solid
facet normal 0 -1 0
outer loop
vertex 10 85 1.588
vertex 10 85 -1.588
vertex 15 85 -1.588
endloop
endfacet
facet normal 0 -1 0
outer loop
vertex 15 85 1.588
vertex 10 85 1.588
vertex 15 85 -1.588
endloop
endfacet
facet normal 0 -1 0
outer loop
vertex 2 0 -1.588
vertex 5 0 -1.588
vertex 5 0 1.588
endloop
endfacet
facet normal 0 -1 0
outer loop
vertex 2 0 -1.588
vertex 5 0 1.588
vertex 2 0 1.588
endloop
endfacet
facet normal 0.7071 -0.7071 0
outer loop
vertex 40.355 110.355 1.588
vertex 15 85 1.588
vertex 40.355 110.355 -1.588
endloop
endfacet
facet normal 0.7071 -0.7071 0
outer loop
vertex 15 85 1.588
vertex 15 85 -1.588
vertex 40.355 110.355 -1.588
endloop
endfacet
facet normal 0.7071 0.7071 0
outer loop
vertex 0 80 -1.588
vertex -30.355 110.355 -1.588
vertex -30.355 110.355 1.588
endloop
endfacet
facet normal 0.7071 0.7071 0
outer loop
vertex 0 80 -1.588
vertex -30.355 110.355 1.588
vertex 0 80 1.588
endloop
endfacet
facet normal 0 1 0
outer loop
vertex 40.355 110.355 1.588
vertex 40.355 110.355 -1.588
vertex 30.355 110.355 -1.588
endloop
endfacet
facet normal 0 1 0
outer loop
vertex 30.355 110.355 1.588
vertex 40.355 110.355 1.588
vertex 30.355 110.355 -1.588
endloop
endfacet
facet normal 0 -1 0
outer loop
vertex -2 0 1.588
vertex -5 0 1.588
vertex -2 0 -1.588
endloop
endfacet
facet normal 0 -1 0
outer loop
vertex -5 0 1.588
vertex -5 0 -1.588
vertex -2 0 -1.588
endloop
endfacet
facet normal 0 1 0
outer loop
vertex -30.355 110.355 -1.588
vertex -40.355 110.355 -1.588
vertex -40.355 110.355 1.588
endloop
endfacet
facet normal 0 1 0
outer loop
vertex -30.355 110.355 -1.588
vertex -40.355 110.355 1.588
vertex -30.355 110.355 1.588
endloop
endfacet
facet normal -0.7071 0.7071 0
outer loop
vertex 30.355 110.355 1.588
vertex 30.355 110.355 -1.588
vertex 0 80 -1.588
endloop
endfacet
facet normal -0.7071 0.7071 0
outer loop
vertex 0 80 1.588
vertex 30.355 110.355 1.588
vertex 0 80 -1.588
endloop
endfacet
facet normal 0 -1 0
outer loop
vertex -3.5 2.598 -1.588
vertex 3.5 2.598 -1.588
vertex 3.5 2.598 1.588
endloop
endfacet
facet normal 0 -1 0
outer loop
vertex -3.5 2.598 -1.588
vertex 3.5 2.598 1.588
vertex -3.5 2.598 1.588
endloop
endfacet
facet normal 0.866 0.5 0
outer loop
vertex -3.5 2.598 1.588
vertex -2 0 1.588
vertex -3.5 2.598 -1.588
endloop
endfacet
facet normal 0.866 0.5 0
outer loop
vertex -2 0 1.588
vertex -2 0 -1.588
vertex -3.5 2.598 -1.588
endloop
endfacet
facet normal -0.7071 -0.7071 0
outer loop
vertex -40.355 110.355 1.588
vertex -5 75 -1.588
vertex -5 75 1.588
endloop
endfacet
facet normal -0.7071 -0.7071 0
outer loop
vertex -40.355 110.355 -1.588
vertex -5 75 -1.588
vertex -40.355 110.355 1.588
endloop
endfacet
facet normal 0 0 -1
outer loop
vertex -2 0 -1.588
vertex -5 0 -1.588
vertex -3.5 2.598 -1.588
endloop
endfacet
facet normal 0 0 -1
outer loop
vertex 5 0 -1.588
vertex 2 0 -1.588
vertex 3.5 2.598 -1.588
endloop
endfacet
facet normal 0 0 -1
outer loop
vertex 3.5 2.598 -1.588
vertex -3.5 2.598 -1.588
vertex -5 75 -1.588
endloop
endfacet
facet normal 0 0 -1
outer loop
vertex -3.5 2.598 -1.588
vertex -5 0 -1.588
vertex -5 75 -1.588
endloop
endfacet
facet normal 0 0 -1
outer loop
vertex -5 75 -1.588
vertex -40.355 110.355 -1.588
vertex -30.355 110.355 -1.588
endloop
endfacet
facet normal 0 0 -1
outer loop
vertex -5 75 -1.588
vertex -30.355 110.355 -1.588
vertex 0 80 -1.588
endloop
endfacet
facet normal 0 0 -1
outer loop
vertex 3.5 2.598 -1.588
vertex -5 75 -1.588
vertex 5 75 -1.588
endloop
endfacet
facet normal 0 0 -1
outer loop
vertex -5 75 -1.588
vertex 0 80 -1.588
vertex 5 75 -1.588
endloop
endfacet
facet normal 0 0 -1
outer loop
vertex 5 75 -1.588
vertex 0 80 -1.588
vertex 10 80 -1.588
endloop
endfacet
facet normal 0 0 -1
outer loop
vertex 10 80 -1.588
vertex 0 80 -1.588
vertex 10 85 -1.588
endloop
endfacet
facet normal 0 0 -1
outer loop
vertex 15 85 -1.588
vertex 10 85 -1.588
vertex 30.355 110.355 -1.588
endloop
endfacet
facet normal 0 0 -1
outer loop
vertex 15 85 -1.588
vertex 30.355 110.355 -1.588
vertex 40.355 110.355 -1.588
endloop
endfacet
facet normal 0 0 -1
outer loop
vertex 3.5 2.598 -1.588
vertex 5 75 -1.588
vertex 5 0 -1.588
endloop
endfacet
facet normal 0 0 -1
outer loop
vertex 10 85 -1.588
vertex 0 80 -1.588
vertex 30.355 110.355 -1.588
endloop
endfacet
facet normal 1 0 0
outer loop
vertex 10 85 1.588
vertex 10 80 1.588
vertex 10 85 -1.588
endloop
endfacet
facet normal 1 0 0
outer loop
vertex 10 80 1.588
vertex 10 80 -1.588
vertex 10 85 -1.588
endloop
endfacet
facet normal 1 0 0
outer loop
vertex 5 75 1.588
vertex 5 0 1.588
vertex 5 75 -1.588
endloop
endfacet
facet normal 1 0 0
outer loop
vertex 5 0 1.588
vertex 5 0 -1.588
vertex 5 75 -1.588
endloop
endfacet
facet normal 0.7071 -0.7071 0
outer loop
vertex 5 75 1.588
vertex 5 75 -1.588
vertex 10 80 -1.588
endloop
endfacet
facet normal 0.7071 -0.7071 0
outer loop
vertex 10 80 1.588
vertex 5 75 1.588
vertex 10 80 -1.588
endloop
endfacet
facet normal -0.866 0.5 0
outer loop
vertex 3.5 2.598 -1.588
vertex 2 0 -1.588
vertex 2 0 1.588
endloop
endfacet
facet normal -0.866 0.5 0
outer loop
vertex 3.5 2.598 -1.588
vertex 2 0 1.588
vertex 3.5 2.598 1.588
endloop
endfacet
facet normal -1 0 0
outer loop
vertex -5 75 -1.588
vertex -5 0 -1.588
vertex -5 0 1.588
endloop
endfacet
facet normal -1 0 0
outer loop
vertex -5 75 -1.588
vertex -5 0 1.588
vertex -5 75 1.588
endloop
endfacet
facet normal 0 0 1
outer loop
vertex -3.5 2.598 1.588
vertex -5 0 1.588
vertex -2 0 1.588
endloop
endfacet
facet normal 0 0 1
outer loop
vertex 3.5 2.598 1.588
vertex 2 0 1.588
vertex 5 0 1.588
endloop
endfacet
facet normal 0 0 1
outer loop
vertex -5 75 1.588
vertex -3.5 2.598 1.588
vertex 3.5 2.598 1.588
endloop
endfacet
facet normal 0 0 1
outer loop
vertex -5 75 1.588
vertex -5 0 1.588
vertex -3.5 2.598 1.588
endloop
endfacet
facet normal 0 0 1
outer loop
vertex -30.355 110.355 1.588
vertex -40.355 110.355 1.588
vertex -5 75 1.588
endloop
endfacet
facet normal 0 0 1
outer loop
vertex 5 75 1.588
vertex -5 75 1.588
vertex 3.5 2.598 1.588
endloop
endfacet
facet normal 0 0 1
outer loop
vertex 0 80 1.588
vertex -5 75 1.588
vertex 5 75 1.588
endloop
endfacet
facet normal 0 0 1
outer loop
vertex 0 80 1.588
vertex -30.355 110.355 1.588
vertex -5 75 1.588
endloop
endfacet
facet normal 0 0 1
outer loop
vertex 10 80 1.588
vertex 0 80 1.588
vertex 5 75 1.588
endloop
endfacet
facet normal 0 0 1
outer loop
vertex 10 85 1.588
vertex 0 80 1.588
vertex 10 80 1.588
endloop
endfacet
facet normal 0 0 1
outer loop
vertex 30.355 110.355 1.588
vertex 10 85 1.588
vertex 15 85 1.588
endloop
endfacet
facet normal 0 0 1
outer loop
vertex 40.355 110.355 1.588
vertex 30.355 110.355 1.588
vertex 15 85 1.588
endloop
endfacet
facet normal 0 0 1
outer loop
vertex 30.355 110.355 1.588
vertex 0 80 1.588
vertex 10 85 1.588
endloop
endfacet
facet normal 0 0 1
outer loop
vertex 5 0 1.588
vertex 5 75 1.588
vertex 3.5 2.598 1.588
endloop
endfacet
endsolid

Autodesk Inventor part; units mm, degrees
ref_plane "YZ Plane" through (0, 0, 0) normal (1, 0, 0) x (0, 1, 0)
ref_plane "XZ Plane" through (0, 0, 0) normal (0, 1, 0) x (-1, 0, 0)
ref_plane "XY Plane" through (0, 0, 0) normal (0, 0, 1) x (1, 0, 0)
sketch "Sketch1" plane through (0, 0, 0) normal (0, 0, 1) x (1, 0, 0)
  line L0 (5, 0) -> (5, 75)
  line L1 (5, 75) -> (0, 75) construction
  line L2 (5, 75) -> (55, 75) construction
  line L3 (40.3553, 110.3553) -> (30.3553, 110.3553)
  line L4 (30.3553, 110.3553) -> (0, 80)
  line L5 (0, 0) -> (0, 80) construction
  line L6 (5, 0) -> (2, 0)
  line L7 (2, 0) -> (3.5, 2.5981)
  line L8 (3.5, 2.5981) -> (0, 2.5981)
  line L9 (-5, 0) -> (-5, 75)
  line L10 (-5, 75) -> (-40.3553, 110.3553)
  line L11 (-40.3553, 110.3553) -> (-30.3553, 110.3553)
  line L12 (-30.3553, 110.3553) -> (0, 80)
  line L13 (-5, 0) -> (-2, 0)
  line L14 (-2, 0) -> (-3.5, 2.5981)
  line L15 (-3.5, 2.5981) -> (0, 2.5981)
  line L16 (10, 80) -> (10, 85)
  line L17 (10, 85) -> (15, 85)
  line L18 (5, 75) -> (10, 80)
  line L19 (15, 85) -> (40.3553, 110.3553)
  dimension "d0" = 5
  dimension "d1" = 75
  dimension "d2" = 50
  dimension "d5" = 10
  dimension "d6" = 3
  dimension "d7" = 3
  dimension "d8" = 60
  dimension "d9" = 5
  dimension "d15" = 45
  dimension "d16" = 5
  dimension "d17" = 5
extrude "Extrusion1" add sketch "Sketch1" along normal mid plane 3.175
properties part number "Liu_Inital_Y"
